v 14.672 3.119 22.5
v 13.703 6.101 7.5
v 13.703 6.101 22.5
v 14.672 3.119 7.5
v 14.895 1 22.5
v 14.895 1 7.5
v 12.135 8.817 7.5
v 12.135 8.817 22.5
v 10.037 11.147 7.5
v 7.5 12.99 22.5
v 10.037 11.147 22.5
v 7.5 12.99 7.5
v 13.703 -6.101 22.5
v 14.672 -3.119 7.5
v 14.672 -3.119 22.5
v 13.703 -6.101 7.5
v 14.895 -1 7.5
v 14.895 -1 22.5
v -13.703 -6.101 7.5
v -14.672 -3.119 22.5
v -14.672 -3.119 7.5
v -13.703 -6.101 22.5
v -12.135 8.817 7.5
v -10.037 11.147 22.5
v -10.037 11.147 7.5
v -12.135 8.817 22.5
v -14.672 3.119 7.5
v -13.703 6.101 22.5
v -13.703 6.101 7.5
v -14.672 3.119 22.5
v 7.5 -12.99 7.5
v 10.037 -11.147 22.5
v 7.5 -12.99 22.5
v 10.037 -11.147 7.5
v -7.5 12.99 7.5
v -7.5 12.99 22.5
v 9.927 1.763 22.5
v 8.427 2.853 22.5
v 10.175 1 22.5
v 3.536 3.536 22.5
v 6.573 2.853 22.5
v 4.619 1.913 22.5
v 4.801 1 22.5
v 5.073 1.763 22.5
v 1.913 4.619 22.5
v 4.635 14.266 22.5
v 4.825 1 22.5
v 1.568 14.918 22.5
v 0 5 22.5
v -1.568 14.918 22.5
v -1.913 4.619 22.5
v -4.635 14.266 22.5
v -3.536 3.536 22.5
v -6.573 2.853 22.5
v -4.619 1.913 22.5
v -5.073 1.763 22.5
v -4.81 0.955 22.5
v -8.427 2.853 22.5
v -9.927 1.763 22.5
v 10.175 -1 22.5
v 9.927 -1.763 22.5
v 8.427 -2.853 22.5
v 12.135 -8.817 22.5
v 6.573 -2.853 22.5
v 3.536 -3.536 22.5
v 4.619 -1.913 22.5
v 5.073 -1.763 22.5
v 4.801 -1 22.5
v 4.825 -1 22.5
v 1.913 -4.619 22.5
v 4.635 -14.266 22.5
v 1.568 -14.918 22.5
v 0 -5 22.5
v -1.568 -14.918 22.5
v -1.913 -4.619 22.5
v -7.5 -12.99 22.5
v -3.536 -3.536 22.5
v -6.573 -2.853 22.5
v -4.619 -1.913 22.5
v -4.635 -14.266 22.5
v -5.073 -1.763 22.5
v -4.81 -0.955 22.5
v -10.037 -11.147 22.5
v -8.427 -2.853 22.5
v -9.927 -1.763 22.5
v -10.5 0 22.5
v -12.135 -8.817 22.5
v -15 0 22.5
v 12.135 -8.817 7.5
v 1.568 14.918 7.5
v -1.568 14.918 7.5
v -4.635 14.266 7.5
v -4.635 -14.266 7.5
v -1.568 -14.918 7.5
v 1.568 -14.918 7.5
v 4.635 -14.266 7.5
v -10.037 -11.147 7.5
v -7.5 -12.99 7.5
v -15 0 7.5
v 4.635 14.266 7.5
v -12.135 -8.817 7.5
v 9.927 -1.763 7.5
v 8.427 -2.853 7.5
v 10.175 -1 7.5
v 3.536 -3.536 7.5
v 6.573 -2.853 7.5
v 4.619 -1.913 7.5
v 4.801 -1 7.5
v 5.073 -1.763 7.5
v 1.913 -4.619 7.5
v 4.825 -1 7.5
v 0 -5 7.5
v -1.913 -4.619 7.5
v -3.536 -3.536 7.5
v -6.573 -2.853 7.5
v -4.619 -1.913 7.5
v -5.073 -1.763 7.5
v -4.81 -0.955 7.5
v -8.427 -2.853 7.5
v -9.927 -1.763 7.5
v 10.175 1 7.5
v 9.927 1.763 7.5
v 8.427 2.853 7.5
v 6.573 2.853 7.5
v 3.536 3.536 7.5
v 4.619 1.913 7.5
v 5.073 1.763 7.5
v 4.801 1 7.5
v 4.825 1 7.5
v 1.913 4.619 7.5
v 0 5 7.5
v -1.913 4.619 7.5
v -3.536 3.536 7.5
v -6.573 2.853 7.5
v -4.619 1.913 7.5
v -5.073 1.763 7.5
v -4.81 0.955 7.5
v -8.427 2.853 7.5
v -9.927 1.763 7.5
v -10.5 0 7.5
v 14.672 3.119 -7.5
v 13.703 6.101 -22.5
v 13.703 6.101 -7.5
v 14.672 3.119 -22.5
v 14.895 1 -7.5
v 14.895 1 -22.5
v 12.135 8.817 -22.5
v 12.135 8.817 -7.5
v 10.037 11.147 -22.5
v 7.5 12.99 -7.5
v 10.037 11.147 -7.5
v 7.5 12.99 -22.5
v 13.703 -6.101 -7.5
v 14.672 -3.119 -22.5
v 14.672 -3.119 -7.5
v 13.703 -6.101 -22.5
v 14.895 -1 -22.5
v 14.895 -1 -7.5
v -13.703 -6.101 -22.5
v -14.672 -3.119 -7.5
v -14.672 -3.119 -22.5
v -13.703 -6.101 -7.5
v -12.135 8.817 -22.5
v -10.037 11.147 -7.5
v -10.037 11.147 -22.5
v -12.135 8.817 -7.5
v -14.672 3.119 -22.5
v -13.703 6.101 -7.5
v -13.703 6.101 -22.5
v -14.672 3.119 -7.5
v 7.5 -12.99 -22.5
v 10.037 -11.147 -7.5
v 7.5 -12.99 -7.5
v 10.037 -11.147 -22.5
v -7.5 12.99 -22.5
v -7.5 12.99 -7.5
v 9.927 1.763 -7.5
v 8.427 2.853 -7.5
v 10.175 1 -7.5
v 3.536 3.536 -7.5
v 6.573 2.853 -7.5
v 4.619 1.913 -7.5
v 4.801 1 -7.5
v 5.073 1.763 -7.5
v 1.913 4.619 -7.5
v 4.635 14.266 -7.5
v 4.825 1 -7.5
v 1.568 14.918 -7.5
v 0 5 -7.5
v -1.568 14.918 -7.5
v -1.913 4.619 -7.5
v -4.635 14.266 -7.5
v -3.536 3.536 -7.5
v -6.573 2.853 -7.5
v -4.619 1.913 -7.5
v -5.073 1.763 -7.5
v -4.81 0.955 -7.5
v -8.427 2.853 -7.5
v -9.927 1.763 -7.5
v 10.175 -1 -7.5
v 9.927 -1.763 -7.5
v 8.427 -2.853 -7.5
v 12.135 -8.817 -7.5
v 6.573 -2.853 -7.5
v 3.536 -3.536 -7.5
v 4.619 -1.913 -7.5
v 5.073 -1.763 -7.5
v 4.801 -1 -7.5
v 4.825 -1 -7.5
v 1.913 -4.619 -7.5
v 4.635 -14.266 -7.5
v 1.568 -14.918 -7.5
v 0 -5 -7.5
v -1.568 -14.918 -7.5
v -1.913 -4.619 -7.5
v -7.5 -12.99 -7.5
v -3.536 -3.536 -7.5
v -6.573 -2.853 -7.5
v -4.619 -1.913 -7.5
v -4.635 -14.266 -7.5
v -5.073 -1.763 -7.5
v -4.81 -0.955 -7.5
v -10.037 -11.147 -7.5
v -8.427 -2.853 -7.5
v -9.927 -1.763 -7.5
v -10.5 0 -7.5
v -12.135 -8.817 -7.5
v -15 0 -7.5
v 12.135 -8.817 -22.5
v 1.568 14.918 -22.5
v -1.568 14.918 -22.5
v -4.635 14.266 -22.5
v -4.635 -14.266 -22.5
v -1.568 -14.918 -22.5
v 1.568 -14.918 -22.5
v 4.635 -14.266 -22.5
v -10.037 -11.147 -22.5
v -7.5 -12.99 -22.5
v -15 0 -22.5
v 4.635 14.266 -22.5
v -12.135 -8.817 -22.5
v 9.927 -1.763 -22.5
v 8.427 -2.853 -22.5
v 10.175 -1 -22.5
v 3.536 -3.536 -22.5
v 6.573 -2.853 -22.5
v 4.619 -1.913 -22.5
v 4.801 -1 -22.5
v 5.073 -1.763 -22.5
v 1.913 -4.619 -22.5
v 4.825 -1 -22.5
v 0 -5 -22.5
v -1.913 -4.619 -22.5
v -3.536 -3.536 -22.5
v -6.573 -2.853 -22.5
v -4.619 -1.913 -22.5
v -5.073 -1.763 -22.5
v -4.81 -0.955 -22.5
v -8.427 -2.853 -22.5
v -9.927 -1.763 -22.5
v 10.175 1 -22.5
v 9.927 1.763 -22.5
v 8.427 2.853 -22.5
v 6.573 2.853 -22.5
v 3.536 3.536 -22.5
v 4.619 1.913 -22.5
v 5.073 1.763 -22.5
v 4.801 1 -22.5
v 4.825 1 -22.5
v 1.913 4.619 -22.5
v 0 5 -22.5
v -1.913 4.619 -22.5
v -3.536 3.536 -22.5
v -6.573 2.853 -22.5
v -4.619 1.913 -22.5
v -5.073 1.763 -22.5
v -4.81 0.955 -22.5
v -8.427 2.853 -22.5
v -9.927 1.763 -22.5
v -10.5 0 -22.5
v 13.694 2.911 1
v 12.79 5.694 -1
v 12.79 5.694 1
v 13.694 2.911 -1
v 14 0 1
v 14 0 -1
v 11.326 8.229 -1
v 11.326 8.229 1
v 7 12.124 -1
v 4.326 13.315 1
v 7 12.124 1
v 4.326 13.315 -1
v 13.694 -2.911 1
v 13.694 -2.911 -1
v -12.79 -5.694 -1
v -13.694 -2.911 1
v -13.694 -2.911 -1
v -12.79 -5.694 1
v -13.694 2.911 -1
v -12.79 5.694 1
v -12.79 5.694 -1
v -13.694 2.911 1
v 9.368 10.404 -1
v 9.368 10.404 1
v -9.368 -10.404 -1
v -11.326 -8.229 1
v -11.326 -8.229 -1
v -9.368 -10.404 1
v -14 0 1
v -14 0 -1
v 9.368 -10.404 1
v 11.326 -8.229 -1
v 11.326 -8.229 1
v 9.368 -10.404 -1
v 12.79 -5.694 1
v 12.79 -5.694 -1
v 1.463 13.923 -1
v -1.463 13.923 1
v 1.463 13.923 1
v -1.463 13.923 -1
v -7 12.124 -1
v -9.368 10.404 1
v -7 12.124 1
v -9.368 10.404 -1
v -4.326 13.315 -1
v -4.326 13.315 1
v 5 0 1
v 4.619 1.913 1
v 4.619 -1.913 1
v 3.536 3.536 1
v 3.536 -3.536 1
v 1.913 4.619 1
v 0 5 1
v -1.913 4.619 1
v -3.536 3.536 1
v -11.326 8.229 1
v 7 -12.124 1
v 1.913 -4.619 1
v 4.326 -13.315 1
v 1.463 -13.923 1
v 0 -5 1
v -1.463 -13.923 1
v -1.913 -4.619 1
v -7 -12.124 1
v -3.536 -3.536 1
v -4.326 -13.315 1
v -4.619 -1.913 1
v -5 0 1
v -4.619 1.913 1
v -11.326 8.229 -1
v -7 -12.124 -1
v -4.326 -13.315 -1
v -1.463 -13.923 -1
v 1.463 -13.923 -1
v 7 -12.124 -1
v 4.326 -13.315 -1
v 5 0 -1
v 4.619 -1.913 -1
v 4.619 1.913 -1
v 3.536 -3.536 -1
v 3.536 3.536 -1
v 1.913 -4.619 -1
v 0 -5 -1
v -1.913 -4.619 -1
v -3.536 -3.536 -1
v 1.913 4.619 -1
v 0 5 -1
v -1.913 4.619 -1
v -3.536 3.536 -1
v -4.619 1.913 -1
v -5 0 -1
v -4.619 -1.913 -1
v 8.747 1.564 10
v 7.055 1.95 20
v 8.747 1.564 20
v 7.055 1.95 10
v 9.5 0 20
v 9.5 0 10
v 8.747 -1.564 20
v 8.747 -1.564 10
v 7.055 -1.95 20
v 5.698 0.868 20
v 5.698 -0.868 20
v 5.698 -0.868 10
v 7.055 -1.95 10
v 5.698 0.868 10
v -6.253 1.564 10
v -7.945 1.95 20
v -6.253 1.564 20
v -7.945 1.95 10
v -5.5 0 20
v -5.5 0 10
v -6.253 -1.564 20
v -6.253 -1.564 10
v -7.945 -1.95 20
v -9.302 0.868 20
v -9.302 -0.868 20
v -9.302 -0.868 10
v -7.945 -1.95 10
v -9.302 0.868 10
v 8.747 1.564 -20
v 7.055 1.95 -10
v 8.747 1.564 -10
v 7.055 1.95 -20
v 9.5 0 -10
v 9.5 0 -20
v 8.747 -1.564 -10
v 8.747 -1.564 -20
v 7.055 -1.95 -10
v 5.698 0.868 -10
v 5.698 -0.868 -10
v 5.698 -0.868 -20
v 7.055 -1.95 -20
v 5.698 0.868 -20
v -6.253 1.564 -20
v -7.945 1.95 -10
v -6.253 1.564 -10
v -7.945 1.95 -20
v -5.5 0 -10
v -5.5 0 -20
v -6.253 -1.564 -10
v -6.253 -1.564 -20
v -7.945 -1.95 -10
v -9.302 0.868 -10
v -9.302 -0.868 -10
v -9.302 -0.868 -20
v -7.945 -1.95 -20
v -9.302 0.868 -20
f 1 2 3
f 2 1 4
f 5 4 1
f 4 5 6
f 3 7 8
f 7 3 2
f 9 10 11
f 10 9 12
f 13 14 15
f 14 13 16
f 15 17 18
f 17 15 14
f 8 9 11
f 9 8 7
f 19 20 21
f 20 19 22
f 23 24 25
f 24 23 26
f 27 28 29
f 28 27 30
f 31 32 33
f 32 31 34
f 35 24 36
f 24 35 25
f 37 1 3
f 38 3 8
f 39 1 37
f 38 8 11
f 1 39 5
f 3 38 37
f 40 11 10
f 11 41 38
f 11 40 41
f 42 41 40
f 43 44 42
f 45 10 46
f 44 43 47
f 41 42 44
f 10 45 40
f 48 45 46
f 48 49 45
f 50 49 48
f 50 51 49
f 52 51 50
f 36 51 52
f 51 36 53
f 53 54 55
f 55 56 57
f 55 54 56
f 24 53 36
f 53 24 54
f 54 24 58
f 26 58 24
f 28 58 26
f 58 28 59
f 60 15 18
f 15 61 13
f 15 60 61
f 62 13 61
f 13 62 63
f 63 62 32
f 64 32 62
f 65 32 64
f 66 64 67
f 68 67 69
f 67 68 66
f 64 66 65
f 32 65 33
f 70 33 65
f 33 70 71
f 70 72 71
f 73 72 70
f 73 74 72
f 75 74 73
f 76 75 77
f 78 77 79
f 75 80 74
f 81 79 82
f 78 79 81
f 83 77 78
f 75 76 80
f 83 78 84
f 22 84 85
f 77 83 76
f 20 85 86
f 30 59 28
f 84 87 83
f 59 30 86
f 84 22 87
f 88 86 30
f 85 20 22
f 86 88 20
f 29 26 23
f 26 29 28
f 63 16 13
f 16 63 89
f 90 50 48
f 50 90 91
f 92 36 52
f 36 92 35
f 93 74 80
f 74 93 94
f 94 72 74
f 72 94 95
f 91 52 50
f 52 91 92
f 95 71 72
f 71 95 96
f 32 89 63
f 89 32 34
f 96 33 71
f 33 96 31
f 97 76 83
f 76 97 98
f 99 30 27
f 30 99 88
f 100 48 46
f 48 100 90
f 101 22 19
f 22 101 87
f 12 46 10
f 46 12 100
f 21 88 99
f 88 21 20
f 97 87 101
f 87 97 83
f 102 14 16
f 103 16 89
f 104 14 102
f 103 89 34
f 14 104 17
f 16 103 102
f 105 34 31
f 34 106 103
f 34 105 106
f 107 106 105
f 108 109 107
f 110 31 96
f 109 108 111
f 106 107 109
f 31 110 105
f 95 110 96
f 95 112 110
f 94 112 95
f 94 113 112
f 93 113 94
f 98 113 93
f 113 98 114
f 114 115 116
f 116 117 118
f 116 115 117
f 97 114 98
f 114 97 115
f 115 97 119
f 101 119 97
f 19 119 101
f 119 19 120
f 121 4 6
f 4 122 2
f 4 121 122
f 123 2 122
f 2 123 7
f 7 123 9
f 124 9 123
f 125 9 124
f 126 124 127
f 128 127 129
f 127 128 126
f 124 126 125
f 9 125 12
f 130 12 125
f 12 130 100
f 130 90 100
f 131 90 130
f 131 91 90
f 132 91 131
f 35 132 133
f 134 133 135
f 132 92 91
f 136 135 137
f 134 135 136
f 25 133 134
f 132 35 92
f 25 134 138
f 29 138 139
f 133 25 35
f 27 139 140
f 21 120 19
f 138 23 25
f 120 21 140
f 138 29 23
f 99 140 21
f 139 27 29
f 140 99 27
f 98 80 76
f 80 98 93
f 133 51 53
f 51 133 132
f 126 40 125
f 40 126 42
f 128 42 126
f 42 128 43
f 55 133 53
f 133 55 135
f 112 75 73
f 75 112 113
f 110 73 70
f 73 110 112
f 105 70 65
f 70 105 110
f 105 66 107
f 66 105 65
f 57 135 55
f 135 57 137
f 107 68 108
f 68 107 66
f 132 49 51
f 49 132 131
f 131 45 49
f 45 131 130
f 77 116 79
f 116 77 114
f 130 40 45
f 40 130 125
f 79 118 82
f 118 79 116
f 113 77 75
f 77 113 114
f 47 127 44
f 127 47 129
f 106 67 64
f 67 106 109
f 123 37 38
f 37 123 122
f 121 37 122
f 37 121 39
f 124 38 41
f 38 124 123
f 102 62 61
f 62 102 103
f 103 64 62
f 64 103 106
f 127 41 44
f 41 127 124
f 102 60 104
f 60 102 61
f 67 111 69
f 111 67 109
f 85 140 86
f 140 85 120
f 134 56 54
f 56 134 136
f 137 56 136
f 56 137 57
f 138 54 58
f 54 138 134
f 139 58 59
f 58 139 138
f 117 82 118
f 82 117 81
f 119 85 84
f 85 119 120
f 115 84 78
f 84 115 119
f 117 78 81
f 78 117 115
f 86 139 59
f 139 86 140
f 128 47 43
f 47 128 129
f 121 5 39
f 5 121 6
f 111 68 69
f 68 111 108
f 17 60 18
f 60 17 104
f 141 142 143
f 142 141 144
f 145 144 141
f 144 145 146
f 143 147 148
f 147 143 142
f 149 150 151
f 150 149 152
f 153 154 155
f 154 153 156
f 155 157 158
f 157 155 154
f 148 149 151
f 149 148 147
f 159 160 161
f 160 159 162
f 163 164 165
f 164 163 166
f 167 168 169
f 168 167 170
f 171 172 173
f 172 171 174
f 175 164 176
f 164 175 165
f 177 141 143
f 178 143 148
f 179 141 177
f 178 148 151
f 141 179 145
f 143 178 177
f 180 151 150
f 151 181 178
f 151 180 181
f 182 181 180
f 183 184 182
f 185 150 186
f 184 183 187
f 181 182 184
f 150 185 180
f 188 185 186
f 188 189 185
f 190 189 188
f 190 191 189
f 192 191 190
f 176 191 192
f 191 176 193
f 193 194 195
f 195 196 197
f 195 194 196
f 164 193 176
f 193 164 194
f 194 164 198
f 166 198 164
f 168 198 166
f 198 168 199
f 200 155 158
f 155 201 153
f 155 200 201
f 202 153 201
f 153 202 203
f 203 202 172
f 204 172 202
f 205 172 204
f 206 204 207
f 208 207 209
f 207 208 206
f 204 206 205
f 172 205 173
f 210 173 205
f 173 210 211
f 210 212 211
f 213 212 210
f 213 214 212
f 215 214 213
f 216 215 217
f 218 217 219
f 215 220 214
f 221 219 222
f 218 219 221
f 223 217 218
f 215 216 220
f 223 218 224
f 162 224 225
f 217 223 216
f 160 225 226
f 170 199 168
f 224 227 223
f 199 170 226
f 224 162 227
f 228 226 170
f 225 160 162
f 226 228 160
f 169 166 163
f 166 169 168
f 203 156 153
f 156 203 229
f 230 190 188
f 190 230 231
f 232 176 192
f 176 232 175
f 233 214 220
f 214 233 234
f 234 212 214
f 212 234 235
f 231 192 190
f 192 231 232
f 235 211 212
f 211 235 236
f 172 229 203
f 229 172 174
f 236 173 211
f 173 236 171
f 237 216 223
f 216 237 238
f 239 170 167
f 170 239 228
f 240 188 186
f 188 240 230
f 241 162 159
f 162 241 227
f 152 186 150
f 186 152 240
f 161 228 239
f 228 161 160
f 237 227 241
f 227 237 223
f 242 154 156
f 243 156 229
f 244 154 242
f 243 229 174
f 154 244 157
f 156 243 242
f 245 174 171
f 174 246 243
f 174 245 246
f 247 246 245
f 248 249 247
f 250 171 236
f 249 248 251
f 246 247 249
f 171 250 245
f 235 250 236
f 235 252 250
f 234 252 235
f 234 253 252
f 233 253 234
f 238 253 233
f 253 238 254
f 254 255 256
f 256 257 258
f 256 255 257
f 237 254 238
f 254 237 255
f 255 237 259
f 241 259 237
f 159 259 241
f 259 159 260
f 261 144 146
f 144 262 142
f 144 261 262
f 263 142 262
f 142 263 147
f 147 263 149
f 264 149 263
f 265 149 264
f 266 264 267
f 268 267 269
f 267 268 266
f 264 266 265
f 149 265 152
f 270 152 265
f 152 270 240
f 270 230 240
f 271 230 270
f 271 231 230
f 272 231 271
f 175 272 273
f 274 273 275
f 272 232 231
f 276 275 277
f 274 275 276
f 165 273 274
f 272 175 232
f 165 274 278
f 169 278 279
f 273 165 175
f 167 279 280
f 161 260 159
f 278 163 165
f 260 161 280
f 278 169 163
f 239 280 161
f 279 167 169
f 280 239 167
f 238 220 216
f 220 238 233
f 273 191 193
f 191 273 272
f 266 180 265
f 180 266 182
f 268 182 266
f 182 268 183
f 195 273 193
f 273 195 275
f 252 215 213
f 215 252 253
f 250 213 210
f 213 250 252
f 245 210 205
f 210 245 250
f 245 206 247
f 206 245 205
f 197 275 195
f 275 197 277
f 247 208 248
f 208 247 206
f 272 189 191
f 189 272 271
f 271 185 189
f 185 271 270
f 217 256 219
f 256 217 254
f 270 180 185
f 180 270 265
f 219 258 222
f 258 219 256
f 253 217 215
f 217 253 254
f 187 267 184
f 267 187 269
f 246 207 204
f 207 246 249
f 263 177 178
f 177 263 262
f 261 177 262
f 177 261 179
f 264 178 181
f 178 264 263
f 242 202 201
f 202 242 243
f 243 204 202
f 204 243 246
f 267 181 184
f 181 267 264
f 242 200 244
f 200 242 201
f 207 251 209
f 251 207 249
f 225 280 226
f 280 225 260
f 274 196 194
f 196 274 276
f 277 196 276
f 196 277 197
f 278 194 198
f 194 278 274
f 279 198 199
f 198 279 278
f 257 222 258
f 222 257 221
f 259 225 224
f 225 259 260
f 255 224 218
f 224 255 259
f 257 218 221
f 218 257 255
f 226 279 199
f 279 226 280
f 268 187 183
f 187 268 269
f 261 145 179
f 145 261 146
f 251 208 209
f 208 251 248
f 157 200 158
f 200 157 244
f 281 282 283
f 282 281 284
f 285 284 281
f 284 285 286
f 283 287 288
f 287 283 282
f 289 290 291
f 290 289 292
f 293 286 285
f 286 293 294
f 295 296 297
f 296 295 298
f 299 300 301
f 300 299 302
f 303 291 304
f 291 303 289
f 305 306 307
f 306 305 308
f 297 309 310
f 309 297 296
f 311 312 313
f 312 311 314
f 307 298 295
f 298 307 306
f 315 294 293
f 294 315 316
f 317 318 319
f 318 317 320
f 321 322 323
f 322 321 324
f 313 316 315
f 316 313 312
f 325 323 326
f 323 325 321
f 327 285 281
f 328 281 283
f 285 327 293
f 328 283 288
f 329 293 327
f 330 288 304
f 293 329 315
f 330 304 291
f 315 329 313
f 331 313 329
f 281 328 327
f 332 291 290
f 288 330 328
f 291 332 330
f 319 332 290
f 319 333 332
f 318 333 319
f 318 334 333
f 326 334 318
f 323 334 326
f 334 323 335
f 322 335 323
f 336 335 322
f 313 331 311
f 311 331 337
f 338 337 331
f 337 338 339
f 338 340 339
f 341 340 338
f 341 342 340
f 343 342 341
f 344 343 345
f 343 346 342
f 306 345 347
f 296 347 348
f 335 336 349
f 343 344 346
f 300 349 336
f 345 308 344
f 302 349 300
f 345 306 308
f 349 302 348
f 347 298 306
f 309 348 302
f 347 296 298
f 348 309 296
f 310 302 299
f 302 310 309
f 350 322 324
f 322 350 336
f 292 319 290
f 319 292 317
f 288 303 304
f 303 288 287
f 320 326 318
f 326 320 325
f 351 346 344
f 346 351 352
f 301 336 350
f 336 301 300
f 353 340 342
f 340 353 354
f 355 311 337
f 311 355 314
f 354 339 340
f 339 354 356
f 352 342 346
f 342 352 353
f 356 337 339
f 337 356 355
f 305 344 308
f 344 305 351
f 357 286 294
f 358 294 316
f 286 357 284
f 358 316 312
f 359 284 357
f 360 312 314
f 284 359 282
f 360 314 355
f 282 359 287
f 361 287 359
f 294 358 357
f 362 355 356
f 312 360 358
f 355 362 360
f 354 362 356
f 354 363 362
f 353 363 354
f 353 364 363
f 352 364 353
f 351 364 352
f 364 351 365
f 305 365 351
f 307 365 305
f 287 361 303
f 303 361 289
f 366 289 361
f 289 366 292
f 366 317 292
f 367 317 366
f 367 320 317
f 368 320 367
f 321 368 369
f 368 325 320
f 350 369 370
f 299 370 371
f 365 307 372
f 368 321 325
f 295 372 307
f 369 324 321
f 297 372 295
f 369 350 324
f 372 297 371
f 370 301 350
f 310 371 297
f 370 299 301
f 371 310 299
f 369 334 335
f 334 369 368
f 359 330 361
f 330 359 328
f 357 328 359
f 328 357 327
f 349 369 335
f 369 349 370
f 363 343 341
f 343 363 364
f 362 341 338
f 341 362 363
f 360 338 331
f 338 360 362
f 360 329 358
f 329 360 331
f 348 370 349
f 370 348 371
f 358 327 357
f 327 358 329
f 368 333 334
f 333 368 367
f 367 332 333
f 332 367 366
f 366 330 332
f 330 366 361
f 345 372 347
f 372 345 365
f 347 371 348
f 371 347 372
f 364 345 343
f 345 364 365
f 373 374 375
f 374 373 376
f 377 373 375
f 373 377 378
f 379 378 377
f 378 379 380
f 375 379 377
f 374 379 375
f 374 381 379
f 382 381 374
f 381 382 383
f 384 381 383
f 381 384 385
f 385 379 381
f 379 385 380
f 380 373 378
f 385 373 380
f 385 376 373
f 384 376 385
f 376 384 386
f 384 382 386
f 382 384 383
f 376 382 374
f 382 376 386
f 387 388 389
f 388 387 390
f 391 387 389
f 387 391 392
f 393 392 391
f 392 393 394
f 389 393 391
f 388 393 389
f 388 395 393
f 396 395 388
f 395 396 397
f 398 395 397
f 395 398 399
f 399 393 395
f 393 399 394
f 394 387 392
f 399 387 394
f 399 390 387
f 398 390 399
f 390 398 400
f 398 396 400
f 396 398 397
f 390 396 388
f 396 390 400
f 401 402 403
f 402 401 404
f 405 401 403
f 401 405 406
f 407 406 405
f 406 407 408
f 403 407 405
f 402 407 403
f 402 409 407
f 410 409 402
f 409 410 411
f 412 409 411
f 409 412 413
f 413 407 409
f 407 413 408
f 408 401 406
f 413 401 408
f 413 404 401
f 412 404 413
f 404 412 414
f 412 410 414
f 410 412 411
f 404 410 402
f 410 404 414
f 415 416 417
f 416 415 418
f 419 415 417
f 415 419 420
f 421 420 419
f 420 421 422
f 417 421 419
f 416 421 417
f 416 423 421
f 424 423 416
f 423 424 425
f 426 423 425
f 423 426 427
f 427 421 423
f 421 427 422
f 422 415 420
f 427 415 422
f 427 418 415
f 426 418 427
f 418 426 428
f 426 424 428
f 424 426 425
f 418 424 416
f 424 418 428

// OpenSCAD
// Parameters
clamp_diameter = 30;
clamp_height = 15;
bore_diameter = 10;
hole_diameter = 6;
slit_width = 2;
flexible_element_thickness = 2;
screw_diameter = 4;
screw_length = 10;

// Clamp Half Module
module clamp_half() {
    difference() {
        cylinder(d=clamp_diameter, h=clamp_height, center=true);
        
        // Central bore
        cylinder(d=bore_diameter, h=clamp_height + 2, center=true);
        
        // Side holes
        translate([clamp_diameter/4, 0, 0])
            cylinder(d=hole_diameter, h=clamp_height + 2, center=true);
        translate([-clamp_diameter/4, 0, 0])
            cylinder(d=hole_diameter, h=clamp_height + 2, center=true);
        
        // Slit for clamping
        translate([clamp_diameter/2, 0, 0])
            cube([clamp_diameter, slit_width, clamp_height + 2], center=true);
    }
}

// Flexible Element Module
module flexible_element() {
    difference() {
        cylinder(d=clamp_diameter - 2, h=flexible_element_thickness, center=true);
        cylinder(d=bore_diameter, h=flexible_element_thickness + 2, center=true);
    }
}

// Fastening Screw Module
module fastening_screw() {
    cylinder(d=screw_diameter, h=screw_length, center=true);
}

// Assembly
module coupling() {
    translate([0, 0, clamp_height])
        clamp_half();
    
    translate([0, 0, -clamp_height])
        clamp_half();
    
    translate([0, 0, 0])
        flexible_element();
    
    // Fastening screws
    translate([clamp_diameter/4, 0, clamp_height])
        fastening_screw();
    translate([-clamp_diameter/4, 0, clamp_height])
        fastening_screw();
    translate([clamp_diameter/4, 0, -clamp_height])
        fastening_screw();
    translate([-clamp_diameter/4, 0, -clamp_height])
        fastening_screw();
}

// Render the coupling
coupling();
